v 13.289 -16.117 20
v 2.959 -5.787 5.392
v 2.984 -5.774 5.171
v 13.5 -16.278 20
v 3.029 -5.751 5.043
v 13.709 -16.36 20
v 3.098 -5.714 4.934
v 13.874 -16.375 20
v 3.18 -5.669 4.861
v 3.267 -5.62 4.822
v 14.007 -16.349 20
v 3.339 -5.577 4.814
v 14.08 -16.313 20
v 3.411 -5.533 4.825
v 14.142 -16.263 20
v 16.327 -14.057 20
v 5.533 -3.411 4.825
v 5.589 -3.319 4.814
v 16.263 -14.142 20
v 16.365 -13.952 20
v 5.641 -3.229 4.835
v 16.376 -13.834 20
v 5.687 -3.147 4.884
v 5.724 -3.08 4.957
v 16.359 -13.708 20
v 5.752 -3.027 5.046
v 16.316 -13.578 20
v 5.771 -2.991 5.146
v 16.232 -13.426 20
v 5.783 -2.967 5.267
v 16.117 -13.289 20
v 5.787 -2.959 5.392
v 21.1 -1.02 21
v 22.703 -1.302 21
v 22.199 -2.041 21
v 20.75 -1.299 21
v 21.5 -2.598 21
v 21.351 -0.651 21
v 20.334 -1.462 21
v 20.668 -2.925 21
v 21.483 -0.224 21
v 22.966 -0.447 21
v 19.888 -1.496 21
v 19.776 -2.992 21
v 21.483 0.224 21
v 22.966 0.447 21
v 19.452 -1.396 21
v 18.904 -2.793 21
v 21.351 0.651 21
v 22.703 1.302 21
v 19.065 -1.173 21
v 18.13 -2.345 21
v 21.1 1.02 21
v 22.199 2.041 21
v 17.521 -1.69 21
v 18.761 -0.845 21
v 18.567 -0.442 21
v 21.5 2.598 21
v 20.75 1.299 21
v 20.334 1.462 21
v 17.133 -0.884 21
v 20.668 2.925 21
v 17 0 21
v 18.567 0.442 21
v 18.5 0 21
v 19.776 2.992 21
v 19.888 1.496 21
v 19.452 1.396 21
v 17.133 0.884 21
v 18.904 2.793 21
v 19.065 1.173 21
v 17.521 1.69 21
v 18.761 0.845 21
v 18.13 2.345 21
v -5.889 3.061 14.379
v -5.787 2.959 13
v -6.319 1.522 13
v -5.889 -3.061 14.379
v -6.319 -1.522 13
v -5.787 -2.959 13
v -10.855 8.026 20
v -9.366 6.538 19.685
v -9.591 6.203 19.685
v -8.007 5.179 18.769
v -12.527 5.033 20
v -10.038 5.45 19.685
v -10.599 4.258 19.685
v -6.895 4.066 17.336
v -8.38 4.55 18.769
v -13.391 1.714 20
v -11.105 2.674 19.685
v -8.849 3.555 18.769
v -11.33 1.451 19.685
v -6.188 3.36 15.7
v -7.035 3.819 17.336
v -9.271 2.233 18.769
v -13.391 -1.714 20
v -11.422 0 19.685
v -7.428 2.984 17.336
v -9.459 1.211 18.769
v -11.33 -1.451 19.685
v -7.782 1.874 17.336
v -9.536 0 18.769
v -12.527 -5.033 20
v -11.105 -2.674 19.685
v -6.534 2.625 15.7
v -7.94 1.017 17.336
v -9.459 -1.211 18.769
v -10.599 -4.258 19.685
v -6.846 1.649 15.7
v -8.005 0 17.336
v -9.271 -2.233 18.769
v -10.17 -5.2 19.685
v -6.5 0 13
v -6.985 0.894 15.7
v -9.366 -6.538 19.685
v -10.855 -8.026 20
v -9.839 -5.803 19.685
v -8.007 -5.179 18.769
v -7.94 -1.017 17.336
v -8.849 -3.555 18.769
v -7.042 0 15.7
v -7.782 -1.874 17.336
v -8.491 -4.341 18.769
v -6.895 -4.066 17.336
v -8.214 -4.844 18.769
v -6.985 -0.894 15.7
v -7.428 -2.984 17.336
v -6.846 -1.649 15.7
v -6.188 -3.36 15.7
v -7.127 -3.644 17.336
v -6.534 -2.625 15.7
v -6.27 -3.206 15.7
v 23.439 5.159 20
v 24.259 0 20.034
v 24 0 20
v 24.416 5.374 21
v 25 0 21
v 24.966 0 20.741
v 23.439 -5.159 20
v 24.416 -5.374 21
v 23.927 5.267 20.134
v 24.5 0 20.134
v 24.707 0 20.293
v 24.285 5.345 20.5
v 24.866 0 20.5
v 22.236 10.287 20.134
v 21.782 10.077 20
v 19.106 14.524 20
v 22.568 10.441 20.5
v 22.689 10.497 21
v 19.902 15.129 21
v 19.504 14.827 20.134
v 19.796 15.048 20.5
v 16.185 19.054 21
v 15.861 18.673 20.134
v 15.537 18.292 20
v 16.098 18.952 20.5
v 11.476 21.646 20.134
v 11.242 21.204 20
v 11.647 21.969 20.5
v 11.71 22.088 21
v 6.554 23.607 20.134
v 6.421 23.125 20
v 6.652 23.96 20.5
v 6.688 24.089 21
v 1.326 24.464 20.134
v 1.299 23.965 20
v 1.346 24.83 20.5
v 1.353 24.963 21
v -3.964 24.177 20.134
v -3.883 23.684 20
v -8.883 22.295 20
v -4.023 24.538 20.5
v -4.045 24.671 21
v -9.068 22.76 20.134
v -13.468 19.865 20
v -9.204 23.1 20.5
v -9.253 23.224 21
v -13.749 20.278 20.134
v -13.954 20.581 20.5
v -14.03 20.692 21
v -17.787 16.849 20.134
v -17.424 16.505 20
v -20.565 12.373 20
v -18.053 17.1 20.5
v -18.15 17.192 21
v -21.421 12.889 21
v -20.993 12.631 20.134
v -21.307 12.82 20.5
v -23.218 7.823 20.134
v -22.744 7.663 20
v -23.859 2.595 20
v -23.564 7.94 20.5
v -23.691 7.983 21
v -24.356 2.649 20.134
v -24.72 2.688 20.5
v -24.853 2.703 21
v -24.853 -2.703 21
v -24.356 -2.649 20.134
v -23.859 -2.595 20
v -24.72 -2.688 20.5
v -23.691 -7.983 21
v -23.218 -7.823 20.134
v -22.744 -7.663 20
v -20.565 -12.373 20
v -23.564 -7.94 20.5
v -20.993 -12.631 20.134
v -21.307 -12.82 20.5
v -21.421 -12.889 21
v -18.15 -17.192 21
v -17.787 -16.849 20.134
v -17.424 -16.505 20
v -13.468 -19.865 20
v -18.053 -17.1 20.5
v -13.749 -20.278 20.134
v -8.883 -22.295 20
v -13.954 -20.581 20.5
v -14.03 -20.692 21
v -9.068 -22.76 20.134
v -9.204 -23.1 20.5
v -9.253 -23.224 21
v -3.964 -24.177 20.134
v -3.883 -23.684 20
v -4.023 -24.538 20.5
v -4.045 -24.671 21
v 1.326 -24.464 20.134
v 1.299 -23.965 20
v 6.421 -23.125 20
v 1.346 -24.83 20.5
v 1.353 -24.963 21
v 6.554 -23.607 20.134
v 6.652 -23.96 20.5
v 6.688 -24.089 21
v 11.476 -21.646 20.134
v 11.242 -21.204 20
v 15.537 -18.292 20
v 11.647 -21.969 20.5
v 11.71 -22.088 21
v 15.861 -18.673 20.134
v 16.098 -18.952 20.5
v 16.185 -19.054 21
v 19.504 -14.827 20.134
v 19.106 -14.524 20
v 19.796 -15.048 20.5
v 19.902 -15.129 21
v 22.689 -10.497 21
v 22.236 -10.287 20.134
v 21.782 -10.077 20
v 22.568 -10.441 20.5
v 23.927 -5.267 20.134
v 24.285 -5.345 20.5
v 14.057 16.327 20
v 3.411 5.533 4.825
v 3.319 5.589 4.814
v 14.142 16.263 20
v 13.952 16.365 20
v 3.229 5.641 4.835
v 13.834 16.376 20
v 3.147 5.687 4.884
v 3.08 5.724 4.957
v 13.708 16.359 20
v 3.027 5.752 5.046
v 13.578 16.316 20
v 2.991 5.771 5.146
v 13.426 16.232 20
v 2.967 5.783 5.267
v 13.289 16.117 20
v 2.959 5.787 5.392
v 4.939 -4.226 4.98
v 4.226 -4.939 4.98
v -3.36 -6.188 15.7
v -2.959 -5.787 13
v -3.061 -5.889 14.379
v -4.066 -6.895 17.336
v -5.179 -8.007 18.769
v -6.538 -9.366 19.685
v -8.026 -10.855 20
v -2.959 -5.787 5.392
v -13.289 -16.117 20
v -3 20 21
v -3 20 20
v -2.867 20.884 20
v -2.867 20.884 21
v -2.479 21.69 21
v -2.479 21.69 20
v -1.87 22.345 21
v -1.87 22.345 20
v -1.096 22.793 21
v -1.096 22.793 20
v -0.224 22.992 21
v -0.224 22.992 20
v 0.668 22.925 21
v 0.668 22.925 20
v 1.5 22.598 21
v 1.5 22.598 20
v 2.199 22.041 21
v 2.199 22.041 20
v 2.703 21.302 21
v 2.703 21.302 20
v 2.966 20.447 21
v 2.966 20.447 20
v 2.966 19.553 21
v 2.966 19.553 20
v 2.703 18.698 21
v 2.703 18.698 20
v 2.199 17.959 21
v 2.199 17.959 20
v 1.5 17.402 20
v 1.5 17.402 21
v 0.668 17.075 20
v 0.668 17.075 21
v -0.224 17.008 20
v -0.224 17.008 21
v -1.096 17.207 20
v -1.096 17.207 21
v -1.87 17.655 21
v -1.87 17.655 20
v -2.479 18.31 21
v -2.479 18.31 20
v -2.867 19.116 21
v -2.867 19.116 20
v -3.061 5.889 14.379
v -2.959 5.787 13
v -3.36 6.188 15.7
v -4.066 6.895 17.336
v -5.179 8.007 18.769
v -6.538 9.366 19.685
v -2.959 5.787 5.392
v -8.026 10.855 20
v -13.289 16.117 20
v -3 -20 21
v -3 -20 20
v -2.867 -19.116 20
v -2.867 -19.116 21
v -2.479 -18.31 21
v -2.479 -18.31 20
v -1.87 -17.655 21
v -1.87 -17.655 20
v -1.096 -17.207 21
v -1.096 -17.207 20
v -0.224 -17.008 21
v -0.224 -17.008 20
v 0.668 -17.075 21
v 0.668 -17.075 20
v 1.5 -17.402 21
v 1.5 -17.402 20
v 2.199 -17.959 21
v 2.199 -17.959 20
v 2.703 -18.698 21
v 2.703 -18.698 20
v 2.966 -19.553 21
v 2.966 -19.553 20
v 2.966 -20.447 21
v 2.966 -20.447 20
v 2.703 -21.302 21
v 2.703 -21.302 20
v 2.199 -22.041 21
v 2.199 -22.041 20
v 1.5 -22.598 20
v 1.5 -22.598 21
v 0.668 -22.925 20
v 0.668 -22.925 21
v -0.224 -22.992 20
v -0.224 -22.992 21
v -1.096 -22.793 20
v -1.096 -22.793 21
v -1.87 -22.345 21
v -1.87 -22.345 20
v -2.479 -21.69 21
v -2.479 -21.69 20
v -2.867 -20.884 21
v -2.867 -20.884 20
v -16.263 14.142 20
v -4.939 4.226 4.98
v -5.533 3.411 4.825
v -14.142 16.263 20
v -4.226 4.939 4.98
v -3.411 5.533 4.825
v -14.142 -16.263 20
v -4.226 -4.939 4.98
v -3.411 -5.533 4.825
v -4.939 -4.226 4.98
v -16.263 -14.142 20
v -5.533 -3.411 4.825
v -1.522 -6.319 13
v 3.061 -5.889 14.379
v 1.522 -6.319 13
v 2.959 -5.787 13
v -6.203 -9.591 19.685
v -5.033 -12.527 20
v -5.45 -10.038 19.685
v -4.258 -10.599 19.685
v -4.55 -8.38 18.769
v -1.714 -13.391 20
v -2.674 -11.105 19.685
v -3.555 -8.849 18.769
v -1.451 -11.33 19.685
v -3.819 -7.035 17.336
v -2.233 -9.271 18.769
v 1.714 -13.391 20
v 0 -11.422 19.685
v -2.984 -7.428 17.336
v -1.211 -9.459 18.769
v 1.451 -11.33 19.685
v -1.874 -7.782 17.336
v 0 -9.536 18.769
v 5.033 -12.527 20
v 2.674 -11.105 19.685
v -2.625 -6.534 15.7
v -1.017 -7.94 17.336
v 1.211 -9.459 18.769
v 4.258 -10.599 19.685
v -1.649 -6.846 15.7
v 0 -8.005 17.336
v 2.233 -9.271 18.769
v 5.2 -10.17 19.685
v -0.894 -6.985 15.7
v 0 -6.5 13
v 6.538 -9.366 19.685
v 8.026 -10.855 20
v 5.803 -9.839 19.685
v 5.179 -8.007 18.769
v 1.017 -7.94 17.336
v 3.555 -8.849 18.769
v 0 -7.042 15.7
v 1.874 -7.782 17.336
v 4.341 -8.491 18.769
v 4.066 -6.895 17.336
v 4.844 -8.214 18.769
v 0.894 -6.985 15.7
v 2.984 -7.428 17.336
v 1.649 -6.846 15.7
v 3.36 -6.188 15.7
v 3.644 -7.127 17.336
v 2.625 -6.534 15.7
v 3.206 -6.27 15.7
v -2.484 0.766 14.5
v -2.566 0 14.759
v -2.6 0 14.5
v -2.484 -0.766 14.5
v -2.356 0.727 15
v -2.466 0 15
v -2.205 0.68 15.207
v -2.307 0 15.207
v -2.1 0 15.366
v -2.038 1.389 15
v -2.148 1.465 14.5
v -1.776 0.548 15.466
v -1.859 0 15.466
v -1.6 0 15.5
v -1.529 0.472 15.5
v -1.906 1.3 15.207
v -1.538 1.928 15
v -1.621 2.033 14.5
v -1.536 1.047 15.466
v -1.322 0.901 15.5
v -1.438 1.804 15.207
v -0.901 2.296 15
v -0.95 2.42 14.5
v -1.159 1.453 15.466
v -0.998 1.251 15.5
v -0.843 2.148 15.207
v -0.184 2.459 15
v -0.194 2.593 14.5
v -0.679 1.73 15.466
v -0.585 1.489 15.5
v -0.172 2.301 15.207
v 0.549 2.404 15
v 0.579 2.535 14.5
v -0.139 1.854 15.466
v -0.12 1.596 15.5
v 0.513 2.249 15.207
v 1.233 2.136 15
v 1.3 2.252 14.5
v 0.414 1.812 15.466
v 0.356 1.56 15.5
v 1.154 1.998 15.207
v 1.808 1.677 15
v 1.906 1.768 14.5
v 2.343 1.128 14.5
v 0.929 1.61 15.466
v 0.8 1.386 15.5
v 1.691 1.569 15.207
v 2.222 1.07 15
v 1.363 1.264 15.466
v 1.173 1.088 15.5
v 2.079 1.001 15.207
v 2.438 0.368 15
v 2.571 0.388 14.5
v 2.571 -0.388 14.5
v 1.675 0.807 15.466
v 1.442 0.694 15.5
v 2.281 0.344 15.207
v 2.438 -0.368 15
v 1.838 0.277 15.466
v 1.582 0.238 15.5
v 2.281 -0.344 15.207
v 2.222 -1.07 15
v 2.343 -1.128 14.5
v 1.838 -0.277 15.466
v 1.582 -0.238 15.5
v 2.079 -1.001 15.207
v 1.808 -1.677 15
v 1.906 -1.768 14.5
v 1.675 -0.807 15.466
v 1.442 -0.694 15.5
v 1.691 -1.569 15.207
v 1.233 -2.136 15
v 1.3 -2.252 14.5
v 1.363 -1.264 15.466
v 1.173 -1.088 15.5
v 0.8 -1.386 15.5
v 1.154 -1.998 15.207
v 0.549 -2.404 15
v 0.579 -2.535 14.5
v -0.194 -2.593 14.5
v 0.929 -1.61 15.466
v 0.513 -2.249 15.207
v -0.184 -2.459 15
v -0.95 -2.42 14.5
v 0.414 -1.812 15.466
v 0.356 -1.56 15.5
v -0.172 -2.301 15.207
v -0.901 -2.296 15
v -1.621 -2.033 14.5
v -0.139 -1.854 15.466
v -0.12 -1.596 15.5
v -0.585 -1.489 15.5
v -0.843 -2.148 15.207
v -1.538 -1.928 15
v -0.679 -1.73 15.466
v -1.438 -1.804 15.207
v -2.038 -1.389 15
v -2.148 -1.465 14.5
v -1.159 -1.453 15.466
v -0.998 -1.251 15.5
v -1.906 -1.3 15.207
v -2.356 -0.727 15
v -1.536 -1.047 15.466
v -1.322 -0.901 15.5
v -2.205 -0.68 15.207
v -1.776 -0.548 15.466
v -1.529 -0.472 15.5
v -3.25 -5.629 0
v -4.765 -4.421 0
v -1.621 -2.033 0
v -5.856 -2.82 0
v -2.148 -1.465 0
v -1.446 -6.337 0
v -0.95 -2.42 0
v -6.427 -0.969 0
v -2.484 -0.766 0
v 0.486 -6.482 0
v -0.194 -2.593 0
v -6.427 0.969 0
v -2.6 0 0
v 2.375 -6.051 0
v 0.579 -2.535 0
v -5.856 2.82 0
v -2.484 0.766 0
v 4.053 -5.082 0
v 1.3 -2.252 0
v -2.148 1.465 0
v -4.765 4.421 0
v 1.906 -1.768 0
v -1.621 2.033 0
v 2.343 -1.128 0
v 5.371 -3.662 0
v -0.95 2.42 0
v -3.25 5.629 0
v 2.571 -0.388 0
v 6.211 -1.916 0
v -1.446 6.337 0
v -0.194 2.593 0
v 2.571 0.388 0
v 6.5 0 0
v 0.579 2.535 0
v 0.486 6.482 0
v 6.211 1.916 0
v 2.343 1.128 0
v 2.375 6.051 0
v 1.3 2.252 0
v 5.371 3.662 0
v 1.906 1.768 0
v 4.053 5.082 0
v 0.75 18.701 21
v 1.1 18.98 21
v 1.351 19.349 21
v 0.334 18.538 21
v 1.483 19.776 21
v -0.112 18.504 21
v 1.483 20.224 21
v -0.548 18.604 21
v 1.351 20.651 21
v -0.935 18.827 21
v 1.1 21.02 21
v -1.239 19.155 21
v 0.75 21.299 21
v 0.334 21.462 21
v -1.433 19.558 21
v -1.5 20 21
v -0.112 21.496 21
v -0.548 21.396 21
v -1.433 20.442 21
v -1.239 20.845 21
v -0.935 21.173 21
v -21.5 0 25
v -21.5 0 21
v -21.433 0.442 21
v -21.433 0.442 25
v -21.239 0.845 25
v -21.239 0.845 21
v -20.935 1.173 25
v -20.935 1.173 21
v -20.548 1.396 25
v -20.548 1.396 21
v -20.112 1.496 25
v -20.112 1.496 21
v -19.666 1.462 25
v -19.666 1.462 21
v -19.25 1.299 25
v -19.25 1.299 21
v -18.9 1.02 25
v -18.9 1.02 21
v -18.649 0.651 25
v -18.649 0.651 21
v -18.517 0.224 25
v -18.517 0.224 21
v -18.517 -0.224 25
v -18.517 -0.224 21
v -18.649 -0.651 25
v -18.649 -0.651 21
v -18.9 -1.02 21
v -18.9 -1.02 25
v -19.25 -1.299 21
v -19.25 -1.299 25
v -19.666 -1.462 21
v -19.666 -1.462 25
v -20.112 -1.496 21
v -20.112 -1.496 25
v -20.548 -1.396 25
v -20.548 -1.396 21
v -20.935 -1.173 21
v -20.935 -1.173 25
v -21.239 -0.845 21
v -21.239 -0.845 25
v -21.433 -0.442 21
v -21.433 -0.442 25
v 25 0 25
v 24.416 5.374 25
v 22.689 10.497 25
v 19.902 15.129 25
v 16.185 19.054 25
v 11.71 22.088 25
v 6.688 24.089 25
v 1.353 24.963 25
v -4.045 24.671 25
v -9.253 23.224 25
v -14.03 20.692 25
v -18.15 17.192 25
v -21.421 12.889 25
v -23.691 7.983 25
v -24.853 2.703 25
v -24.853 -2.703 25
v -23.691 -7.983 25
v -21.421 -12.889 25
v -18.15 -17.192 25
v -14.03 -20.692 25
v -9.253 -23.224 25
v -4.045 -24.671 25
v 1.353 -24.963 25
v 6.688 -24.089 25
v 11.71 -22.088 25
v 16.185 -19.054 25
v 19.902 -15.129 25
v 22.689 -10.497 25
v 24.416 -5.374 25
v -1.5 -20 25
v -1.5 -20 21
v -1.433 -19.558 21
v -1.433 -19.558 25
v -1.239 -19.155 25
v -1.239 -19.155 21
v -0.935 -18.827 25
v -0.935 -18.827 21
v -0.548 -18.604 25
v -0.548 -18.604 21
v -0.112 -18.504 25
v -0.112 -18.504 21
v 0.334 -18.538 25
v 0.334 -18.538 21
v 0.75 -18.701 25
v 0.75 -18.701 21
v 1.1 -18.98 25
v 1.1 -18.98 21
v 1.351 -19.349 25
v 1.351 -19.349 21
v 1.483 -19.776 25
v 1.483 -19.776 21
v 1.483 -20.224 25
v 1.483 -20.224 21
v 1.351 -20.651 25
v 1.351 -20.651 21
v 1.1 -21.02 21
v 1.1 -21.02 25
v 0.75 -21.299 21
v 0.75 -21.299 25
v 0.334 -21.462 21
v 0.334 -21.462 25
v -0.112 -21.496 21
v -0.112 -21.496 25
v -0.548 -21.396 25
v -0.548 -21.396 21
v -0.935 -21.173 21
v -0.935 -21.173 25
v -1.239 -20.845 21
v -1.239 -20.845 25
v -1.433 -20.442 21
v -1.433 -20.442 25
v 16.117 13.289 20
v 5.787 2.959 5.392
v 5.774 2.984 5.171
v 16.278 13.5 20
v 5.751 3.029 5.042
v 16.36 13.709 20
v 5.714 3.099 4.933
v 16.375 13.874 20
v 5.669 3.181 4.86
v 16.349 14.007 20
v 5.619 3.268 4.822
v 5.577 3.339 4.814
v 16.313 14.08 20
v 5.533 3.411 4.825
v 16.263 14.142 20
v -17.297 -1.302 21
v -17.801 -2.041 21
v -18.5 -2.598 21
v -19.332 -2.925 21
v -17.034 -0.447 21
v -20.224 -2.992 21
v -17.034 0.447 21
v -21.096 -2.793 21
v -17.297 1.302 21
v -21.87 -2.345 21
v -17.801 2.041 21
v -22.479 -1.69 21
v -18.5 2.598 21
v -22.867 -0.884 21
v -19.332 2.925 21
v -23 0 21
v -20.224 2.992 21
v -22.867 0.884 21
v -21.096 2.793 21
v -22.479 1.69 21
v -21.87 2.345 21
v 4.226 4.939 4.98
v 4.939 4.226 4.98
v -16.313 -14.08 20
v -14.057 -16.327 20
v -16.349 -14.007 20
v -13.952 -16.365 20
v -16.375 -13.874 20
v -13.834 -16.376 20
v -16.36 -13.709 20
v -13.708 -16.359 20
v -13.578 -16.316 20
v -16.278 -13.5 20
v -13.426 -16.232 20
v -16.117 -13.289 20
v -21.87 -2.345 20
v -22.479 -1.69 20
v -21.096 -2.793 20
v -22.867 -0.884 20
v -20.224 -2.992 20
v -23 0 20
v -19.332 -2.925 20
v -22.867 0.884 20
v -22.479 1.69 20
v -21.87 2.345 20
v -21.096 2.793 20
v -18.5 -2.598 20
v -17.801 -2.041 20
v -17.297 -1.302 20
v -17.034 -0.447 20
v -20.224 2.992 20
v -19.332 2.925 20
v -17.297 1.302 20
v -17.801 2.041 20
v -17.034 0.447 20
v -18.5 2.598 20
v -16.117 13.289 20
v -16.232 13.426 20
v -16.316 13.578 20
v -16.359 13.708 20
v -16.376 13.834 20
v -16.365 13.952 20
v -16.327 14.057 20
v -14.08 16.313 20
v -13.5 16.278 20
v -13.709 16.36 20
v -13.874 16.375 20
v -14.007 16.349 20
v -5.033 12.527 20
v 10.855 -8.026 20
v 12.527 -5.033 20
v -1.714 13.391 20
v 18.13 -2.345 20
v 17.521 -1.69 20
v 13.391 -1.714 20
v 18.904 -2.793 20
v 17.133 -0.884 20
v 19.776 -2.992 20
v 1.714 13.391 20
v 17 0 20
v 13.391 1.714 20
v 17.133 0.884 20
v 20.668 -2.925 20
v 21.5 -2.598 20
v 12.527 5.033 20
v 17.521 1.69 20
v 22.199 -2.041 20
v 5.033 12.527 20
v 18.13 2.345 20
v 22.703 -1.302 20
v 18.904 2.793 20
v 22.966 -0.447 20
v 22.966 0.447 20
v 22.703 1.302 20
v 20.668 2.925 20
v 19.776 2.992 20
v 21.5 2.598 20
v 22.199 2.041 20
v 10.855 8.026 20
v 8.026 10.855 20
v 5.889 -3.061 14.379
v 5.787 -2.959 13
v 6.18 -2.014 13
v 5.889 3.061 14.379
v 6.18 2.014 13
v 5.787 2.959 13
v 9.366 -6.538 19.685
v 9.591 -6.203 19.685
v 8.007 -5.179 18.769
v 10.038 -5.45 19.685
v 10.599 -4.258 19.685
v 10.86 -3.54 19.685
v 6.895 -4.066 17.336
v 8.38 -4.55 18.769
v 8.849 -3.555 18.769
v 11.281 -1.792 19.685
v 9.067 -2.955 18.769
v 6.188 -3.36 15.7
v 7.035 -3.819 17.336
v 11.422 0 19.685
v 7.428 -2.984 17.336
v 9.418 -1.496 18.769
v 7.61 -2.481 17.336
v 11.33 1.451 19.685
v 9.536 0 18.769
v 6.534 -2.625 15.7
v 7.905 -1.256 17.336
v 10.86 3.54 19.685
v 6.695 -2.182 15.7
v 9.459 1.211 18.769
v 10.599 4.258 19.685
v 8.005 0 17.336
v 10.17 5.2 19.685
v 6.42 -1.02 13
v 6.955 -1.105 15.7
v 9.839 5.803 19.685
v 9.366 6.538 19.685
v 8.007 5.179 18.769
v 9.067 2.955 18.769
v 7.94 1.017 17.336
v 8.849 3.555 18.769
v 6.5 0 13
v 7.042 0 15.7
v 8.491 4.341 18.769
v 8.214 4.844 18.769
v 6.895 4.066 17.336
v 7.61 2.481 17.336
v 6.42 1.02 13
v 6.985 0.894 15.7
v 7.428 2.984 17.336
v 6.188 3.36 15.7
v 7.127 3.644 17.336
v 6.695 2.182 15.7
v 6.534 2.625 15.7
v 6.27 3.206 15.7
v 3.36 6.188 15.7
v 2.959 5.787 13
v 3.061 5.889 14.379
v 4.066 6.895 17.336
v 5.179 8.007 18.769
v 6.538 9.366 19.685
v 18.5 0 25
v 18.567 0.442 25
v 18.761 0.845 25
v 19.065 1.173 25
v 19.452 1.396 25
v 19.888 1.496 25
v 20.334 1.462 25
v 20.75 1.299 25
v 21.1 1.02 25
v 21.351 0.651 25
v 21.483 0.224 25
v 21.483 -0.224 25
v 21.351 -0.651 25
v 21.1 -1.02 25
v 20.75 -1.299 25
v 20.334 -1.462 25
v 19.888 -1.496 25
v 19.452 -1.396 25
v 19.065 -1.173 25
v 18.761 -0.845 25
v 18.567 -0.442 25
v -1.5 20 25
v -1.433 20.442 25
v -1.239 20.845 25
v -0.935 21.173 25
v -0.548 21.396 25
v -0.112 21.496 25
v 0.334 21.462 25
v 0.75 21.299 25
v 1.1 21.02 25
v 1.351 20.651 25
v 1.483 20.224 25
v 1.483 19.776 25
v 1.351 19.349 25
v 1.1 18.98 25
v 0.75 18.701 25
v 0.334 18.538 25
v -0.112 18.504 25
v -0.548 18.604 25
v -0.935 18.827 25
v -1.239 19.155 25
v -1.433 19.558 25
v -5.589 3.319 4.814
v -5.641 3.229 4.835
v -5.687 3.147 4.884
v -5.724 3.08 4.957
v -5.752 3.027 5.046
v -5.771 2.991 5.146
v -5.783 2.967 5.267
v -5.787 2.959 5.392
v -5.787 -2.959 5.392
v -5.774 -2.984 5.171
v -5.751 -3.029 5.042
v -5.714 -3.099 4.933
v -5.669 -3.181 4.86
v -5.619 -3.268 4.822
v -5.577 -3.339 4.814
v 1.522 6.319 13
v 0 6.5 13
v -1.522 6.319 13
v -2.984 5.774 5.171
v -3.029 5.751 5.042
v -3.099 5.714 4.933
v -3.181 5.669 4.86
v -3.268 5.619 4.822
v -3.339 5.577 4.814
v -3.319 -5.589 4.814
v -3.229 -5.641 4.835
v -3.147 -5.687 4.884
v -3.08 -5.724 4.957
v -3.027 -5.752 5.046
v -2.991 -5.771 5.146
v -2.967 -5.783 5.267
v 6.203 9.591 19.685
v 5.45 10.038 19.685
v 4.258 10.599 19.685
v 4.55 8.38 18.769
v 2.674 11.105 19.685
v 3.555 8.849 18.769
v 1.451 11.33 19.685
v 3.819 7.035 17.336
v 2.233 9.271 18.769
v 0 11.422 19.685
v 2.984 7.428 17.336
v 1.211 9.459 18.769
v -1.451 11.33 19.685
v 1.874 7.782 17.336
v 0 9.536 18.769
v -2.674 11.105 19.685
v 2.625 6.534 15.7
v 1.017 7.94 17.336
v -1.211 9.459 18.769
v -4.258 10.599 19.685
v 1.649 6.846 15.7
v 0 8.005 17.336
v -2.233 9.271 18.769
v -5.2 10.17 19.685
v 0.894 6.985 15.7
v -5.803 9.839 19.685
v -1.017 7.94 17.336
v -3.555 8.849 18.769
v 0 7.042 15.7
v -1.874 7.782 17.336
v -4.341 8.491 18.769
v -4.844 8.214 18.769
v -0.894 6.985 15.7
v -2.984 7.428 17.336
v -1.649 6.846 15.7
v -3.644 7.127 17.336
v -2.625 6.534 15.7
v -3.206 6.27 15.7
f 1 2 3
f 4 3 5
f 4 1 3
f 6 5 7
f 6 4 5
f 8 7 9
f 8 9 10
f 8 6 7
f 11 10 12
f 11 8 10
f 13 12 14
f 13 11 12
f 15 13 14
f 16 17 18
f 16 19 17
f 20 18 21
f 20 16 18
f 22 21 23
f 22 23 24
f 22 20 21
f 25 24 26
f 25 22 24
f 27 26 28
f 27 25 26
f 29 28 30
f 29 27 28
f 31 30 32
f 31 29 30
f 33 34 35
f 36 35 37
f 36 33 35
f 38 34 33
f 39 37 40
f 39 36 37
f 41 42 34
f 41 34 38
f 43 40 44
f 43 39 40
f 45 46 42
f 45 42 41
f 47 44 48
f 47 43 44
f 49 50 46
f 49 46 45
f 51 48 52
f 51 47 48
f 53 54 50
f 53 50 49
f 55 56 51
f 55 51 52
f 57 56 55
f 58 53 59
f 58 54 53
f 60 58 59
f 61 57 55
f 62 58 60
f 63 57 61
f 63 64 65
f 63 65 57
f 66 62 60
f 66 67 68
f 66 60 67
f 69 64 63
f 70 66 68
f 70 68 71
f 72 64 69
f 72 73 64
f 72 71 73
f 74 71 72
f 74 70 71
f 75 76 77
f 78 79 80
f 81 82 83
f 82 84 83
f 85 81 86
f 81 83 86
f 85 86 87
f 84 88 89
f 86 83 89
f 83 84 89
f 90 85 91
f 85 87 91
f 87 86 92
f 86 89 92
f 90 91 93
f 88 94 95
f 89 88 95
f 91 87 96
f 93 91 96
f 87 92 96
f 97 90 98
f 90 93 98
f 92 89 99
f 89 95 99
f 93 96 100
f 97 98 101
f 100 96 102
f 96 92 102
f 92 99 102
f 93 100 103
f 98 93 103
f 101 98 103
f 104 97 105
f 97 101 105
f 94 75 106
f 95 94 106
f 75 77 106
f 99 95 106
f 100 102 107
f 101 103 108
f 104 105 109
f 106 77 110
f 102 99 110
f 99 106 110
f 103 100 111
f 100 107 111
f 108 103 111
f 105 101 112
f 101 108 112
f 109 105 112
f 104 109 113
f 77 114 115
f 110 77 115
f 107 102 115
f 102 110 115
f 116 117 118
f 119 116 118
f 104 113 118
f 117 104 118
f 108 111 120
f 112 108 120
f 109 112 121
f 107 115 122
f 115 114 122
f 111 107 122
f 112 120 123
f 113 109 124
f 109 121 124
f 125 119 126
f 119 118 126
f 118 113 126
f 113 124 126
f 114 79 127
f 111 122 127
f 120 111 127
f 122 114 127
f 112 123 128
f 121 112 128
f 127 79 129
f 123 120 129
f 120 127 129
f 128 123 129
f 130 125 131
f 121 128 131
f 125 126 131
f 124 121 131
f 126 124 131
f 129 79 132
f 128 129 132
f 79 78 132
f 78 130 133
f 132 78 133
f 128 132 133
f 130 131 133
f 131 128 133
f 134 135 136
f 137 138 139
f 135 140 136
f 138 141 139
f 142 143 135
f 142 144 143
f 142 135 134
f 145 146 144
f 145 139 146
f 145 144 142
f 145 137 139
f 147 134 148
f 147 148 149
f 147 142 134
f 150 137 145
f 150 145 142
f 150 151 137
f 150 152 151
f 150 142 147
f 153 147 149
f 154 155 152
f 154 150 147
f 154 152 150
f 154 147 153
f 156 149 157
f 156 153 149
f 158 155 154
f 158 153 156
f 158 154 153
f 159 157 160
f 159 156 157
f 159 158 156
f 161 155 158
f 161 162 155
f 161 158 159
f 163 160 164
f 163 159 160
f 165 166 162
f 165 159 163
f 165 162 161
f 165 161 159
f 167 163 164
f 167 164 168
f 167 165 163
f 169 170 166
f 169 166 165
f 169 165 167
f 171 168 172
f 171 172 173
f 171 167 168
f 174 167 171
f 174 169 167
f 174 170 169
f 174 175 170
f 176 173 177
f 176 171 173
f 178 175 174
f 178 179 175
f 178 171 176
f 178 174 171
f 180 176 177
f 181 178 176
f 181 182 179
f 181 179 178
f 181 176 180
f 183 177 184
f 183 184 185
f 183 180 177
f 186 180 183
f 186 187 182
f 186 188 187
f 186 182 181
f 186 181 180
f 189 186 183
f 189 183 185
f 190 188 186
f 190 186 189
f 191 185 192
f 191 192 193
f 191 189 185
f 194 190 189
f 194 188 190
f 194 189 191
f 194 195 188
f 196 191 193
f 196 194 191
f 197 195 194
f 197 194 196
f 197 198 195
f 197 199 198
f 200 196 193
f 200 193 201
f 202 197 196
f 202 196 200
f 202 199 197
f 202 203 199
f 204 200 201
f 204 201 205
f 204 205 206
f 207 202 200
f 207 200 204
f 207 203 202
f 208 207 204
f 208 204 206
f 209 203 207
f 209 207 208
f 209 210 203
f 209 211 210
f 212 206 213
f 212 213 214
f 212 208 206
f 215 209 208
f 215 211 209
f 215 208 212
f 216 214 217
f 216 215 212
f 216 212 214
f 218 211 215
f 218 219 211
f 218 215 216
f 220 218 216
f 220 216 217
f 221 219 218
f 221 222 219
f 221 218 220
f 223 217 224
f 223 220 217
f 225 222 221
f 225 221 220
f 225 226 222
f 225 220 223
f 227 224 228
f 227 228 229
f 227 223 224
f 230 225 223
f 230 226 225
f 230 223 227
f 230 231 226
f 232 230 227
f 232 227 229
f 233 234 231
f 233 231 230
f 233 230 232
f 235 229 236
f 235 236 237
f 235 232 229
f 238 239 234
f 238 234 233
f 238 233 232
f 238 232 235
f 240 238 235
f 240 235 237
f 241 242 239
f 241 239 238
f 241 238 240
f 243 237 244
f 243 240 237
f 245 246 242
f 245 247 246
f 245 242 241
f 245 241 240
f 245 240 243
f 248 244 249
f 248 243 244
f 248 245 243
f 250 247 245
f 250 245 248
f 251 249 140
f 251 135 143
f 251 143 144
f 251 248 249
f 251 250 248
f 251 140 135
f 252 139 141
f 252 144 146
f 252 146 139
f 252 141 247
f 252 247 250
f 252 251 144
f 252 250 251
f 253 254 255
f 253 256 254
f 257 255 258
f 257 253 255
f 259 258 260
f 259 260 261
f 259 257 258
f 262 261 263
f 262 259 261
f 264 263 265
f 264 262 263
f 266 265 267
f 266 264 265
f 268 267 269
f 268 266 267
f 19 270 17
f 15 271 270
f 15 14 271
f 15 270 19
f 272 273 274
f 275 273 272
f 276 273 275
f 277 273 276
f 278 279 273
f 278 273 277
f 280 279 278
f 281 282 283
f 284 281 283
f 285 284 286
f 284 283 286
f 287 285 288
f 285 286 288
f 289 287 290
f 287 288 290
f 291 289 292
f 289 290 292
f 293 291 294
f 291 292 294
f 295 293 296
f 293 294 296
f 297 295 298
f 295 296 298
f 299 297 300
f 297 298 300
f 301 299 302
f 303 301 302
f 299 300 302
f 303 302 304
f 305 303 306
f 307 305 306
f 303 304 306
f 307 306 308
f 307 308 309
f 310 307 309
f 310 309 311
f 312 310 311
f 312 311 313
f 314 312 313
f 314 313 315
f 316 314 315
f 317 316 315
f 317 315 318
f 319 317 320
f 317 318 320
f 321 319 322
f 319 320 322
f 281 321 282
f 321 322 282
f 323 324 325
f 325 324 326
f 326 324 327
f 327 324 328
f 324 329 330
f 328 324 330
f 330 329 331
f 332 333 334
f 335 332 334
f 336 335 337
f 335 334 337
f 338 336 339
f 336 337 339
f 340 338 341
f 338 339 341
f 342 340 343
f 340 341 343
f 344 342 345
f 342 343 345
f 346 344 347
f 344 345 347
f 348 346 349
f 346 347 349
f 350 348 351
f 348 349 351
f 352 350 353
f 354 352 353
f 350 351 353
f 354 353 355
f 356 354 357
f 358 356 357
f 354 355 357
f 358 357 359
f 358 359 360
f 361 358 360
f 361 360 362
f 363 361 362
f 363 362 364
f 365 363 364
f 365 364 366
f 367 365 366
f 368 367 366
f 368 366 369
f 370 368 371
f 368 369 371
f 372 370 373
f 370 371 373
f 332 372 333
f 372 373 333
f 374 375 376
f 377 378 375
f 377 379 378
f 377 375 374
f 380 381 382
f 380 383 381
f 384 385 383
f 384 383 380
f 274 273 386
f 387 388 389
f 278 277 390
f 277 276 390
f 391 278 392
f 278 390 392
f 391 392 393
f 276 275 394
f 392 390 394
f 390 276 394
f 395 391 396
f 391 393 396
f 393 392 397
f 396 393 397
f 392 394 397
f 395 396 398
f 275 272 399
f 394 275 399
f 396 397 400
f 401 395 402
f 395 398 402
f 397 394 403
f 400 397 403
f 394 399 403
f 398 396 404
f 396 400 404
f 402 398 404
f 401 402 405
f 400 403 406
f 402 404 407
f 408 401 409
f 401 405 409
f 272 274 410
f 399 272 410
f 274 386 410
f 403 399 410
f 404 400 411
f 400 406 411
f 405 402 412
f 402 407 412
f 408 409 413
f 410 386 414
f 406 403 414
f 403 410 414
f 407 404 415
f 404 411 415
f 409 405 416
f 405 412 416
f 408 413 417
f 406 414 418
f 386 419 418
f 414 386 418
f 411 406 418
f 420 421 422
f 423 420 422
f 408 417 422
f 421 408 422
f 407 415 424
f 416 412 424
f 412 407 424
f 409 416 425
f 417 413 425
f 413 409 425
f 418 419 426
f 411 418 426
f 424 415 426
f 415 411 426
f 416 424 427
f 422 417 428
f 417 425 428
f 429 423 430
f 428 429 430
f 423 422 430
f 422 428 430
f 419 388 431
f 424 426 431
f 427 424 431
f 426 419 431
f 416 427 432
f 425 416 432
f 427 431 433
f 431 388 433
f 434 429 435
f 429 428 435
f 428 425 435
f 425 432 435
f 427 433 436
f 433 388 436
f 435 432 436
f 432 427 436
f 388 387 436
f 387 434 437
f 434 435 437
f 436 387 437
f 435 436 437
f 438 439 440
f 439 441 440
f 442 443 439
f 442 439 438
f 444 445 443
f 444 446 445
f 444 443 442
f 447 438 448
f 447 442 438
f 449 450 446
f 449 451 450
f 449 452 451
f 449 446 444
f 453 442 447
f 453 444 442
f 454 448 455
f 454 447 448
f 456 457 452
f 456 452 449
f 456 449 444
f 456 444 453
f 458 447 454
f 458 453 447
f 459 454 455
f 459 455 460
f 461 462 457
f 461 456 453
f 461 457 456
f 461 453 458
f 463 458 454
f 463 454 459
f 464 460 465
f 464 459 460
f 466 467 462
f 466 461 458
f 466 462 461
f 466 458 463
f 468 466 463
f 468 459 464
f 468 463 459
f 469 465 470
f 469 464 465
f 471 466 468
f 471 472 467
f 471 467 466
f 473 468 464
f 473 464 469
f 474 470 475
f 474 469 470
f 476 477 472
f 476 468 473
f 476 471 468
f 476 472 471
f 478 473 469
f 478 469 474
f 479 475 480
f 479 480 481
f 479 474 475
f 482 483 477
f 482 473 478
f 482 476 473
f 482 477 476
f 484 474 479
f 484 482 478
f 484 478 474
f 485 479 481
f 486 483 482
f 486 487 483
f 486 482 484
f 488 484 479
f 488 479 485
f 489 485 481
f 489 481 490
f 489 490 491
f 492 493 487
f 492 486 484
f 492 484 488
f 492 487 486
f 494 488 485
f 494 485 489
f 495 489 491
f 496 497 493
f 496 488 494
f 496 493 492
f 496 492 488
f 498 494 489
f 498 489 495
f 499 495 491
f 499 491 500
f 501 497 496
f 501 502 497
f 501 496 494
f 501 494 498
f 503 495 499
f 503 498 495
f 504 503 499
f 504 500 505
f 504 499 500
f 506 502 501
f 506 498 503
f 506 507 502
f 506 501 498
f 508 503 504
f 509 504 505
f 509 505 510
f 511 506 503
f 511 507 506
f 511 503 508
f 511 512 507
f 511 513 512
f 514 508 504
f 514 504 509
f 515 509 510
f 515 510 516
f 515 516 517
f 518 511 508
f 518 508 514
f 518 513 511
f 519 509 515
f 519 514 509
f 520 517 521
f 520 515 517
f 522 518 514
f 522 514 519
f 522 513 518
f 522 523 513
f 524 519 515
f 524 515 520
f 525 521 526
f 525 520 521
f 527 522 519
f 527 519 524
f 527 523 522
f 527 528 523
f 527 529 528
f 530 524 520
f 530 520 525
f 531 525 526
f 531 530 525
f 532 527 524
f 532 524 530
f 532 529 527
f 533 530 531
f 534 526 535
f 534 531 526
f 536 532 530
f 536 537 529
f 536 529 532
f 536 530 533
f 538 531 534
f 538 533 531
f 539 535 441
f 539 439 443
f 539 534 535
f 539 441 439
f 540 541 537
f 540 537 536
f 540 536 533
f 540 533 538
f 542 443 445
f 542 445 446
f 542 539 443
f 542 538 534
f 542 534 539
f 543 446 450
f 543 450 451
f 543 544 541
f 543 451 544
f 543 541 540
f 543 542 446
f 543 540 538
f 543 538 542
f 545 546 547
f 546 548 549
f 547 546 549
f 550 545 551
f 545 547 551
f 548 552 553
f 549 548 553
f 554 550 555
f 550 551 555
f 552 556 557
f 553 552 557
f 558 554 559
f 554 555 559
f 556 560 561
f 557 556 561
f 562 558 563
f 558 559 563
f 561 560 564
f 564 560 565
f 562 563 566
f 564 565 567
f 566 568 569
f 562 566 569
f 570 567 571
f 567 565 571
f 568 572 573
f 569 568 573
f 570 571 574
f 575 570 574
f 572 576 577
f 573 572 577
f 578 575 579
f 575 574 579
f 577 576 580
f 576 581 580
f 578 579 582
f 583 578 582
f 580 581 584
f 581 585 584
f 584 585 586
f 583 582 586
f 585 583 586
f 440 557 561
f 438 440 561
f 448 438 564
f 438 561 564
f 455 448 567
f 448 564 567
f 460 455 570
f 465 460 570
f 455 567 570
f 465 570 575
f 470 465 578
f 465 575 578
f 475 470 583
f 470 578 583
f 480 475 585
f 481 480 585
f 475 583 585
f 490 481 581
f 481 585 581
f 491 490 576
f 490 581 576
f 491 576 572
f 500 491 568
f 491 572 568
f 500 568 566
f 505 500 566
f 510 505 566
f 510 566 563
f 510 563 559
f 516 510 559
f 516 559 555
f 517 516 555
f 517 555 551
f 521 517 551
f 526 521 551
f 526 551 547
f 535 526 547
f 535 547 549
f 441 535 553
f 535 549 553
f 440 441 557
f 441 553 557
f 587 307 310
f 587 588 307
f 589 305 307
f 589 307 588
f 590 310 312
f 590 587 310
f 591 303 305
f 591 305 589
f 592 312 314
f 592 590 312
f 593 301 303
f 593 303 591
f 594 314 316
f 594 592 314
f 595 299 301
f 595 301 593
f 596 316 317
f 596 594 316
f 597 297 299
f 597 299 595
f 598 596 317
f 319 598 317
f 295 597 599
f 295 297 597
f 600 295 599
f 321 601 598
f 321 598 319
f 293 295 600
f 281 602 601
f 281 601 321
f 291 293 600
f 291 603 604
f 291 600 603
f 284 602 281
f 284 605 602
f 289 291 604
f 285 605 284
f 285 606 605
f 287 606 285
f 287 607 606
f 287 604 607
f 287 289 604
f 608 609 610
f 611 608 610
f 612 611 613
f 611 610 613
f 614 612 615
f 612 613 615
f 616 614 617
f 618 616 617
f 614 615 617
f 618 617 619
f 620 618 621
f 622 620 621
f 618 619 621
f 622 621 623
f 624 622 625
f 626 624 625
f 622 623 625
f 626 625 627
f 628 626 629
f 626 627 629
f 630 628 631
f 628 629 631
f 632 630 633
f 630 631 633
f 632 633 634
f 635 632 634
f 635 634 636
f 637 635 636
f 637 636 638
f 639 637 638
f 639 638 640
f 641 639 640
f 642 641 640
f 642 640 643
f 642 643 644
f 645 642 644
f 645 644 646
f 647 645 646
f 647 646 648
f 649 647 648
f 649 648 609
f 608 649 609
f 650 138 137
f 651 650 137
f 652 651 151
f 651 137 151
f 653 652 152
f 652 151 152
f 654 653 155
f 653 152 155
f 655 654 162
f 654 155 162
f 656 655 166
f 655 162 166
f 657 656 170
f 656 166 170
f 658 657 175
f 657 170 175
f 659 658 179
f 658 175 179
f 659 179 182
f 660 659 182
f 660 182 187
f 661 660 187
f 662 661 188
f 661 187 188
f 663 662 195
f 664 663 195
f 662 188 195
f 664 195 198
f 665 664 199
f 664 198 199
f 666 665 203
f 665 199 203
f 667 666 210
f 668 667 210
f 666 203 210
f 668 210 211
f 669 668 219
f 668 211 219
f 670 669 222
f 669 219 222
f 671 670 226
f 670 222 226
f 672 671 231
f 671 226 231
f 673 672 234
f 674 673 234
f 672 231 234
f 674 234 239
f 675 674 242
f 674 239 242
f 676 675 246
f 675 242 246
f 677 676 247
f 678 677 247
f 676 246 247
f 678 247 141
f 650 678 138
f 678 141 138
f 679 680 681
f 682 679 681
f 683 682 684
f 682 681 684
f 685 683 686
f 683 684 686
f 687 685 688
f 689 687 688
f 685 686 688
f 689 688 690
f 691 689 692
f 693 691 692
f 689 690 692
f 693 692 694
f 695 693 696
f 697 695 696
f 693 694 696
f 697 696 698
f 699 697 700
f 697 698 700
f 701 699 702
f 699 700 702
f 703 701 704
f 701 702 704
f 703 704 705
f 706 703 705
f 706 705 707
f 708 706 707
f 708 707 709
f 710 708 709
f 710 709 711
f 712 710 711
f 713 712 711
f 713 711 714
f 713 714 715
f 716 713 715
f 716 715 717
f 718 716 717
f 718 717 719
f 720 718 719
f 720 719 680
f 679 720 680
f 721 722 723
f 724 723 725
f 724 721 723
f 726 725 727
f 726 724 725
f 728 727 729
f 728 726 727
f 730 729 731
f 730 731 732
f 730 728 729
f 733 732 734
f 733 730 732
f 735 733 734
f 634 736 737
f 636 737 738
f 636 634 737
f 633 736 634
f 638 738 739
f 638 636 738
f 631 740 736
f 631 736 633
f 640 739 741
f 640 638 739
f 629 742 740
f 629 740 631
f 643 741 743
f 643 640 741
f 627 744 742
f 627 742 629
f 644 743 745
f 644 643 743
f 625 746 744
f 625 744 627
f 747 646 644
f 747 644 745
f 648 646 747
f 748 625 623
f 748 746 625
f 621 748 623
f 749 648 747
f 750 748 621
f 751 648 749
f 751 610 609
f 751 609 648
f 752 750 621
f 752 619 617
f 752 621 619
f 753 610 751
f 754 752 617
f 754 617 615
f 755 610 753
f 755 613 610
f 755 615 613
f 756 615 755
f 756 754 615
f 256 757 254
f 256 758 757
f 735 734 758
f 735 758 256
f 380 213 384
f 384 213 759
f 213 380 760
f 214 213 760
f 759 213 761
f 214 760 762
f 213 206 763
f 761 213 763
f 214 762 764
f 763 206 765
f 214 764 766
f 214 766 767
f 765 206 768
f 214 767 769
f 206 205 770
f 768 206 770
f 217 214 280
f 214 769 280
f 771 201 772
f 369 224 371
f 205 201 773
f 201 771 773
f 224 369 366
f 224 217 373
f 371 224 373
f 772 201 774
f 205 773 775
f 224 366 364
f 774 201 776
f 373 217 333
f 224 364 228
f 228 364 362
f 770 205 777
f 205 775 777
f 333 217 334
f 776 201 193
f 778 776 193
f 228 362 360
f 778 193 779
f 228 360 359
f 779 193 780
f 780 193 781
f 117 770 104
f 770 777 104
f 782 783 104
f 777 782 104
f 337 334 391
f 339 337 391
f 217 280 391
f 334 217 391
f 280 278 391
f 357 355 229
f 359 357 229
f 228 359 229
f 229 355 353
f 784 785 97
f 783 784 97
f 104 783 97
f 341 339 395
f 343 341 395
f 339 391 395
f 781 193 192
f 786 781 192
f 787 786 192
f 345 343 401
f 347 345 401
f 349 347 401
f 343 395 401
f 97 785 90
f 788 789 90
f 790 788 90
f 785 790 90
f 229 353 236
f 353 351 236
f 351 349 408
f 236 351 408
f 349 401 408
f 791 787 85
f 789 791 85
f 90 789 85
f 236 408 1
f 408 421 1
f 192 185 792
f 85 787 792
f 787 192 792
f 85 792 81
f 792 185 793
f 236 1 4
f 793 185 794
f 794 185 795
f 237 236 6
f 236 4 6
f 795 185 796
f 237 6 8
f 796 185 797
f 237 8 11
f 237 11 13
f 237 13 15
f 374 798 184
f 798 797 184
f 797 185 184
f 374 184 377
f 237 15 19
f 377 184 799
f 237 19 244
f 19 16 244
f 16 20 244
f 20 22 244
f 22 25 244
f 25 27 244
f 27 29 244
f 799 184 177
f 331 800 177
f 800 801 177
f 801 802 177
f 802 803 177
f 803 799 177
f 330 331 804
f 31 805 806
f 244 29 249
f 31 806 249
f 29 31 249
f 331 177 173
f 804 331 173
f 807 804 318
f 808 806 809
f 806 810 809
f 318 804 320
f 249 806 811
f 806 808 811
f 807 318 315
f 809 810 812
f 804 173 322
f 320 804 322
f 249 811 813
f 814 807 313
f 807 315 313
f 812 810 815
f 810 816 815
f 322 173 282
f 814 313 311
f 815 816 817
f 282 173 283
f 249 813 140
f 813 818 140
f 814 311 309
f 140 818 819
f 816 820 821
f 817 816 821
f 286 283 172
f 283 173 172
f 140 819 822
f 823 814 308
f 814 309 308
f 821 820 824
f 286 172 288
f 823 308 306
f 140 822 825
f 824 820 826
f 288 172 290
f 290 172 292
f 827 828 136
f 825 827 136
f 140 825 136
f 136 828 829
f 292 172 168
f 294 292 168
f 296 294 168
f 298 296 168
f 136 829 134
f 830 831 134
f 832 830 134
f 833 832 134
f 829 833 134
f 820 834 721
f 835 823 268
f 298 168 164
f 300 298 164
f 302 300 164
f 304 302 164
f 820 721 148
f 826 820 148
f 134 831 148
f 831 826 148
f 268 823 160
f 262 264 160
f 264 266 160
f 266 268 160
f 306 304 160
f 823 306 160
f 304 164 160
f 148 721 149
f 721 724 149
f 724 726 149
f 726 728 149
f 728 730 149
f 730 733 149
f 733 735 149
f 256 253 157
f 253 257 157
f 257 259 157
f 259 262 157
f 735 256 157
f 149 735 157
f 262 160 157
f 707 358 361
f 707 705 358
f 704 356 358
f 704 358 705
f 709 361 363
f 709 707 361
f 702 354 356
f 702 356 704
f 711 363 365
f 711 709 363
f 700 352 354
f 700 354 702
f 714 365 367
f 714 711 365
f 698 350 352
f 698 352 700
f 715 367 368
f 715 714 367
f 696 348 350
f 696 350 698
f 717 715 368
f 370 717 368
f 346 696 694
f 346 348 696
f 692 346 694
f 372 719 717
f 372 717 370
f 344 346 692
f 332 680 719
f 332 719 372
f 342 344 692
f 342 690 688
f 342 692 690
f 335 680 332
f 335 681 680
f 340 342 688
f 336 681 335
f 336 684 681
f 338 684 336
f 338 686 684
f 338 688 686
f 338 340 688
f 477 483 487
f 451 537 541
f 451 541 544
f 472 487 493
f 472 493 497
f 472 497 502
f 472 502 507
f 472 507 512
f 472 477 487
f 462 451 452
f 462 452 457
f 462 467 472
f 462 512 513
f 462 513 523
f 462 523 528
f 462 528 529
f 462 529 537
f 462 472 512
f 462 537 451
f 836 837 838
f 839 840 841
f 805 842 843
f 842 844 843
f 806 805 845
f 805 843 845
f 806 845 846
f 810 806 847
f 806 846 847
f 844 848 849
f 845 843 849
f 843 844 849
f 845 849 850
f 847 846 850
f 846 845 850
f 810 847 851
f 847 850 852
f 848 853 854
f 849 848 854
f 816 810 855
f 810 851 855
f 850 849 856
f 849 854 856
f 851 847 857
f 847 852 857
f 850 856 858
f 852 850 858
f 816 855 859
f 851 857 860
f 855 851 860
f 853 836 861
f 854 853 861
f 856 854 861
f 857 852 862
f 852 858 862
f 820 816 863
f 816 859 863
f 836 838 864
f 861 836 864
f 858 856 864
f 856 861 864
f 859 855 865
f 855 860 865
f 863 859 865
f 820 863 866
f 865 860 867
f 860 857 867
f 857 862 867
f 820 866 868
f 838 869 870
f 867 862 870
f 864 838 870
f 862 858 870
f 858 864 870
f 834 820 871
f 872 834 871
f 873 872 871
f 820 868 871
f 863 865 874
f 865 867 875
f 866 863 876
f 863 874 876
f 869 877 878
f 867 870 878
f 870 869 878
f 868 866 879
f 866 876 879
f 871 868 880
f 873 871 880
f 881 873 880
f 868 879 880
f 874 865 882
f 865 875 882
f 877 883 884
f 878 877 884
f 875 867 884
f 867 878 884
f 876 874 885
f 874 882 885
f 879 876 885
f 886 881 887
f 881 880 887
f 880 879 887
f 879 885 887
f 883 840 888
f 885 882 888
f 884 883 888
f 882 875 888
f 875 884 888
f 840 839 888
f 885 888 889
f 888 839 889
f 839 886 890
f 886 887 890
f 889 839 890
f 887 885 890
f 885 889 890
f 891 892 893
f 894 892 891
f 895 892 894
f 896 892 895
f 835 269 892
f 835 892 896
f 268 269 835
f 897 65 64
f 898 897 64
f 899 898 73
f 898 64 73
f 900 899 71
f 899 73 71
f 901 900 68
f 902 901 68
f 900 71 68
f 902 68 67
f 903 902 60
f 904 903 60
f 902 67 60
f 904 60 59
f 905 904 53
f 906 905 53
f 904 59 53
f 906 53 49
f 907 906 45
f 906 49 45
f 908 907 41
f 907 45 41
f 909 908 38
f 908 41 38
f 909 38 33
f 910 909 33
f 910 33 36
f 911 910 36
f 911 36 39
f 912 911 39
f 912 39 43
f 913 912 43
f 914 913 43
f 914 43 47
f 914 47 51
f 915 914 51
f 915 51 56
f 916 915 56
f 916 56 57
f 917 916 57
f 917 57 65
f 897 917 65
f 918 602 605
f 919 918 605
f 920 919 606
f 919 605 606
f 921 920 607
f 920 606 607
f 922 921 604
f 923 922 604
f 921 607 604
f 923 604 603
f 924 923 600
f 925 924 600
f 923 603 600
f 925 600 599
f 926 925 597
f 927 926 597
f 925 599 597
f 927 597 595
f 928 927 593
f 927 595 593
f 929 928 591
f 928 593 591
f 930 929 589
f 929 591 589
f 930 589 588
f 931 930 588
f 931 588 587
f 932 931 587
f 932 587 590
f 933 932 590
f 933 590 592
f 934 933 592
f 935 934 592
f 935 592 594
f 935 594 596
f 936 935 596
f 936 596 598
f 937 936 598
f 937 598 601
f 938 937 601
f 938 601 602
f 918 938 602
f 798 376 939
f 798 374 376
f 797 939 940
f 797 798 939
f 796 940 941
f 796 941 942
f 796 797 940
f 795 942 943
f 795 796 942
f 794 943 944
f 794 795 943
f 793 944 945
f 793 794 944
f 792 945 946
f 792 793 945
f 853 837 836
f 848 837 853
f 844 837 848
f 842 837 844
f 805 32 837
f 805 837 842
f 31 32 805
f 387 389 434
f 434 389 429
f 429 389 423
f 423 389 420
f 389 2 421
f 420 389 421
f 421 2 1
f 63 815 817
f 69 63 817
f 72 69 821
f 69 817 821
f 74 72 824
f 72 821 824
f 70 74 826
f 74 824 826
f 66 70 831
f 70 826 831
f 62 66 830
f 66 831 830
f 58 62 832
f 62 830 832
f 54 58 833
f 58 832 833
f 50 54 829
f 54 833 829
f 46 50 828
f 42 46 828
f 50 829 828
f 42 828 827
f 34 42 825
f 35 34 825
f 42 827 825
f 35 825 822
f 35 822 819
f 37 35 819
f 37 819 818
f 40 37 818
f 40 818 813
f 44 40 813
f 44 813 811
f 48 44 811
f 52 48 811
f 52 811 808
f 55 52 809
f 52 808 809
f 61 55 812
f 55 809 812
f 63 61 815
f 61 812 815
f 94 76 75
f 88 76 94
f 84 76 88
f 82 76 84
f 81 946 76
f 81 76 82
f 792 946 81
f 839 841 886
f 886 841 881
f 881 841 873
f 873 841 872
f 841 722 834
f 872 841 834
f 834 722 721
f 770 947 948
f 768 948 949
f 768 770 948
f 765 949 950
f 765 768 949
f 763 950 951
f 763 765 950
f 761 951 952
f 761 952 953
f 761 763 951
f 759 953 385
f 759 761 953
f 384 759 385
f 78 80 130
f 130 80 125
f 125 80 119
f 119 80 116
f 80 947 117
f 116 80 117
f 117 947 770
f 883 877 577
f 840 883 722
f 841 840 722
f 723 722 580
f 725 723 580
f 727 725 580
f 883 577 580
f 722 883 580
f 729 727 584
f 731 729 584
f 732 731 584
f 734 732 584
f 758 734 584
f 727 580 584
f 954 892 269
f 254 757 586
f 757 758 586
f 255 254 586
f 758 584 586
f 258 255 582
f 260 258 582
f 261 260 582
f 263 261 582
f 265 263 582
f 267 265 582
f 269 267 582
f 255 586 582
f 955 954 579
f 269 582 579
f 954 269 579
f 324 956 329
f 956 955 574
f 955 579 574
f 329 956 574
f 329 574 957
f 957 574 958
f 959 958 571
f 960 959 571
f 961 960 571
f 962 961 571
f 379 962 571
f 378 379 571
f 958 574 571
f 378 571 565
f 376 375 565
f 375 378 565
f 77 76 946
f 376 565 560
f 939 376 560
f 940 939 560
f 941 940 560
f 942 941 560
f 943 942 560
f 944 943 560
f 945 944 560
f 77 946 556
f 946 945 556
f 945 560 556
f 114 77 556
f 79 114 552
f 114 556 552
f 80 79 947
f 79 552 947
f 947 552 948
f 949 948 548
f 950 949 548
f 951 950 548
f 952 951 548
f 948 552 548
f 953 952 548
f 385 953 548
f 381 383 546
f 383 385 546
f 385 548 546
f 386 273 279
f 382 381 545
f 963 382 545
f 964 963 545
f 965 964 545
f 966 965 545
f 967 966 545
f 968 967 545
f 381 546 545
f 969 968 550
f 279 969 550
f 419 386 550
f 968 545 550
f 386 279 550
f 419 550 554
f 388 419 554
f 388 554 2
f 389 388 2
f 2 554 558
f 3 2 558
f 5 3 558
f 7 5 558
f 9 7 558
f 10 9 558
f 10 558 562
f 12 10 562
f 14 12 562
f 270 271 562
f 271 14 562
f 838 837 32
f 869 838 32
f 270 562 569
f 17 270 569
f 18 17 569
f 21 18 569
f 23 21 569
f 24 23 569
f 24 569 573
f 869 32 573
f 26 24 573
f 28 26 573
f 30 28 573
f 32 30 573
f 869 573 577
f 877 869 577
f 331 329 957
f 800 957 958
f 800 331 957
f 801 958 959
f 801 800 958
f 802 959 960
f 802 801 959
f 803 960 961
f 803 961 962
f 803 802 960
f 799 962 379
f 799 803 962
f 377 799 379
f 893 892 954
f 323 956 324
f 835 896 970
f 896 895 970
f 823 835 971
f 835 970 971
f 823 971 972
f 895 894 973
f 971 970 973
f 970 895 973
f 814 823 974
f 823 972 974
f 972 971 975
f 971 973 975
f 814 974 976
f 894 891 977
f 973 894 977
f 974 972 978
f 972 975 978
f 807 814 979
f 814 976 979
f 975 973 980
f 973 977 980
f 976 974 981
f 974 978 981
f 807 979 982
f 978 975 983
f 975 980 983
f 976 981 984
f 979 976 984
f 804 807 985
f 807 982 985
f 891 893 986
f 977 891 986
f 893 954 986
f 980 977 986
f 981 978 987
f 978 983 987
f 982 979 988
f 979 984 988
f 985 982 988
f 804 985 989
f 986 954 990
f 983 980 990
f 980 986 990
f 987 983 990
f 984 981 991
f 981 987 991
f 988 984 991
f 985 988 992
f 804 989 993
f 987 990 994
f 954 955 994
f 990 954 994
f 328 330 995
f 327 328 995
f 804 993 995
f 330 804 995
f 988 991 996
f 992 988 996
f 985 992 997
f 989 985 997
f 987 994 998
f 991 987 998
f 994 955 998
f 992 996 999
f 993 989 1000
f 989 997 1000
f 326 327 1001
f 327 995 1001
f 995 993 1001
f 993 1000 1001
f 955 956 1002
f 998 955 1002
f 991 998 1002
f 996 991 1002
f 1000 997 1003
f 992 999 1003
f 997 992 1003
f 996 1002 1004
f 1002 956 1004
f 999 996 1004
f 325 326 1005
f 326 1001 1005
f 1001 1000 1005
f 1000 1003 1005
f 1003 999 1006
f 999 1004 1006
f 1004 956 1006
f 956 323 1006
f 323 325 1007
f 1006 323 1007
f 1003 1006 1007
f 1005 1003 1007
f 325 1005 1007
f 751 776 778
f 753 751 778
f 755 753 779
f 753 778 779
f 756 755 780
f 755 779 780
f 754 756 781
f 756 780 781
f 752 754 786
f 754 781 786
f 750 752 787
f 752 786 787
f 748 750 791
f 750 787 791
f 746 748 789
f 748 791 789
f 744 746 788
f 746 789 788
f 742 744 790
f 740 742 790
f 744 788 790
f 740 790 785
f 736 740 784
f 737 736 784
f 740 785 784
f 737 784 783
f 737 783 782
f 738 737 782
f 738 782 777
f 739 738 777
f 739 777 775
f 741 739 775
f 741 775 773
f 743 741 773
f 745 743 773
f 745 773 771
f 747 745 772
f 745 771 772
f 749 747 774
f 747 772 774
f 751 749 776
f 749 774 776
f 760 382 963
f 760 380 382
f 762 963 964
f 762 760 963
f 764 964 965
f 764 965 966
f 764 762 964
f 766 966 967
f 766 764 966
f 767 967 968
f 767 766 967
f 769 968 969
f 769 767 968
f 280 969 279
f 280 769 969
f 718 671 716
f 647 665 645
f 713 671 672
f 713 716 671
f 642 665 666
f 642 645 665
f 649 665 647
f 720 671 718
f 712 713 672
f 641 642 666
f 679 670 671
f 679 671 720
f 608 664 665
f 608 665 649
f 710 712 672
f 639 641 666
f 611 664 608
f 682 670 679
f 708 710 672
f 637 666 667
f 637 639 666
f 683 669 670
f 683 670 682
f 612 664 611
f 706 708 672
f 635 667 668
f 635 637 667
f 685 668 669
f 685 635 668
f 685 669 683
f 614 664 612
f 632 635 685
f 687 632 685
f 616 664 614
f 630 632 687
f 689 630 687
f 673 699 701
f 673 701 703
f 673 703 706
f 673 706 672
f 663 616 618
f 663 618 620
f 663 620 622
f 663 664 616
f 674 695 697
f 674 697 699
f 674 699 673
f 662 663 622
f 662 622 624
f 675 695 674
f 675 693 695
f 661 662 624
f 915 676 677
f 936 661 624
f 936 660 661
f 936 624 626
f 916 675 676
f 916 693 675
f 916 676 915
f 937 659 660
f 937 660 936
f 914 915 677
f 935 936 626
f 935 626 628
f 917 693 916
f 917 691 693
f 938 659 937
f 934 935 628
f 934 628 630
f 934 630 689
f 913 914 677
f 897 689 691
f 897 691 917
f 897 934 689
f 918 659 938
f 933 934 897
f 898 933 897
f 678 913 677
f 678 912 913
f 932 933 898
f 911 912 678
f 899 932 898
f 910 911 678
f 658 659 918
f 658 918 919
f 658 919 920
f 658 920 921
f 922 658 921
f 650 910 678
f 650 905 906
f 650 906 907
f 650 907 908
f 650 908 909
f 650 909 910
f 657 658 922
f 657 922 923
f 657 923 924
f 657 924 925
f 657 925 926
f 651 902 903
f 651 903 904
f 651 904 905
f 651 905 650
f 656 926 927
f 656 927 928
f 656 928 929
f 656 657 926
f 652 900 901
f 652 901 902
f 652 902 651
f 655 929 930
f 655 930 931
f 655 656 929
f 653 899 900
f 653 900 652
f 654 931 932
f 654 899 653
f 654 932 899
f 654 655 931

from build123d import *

# Parameters (mm, degrees)
SKETCH1_R           = 6.5
BOSS_EXTRUDE1_DEPTH = 20
SKETCH4_R           = 2.6
CUT_EXTRUDE1_DEPTH  = 15.5
FILLET1_R           = 1
SKETCH5_R           = 25
BOSS_EXTRUDE2_DEPTH = 5
CUT_EXTRUDE2_REACH  = 42.62
SKETCH6_R           = 1.5
FILLET2_R           = 7
RIB10_REACH         = 45.301
SKETCH12_WALL_W     = 109.815743814
SKETCH12_WALL_H     = 4
CIRPATTERN1_COUNT   = 4
FILLET3_R           = 1
FILLET4_R           = 0.5
SKETCH13_R          = 3
CUT_EXTRUDE3_DEPTH  = 1


with BuildPart() as part:
    # Sketch1 → Boss-Extrude1 (new body)
    with BuildSketch(Plane.XY):
        Circle(SKETCH1_R)
    extrude(amount=BOSS_EXTRUDE1_DEPTH)

    # Sketch4 → Cut-Extrude1 (cut)
    with BuildSketch(Plane(origin=(0, 0, 0), x_dir=(-1, 0, 0), z_dir=(0, 0, -1))):
        Circle(SKETCH4_R)
    extrude(amount=-CUT_EXTRUDE1_DEPTH, mode=Mode.SUBTRACT)

    # Fillet1
    fillet1_edges = [part.edges().sort_by_distance(p)[0] for p in [
        (2.6, 0, 15.5),
    ]]
    fillet(fillet1_edges, radius=FILLET1_R)

    # Sketch5 → Boss-Extrude2 (add)
    with BuildSketch(Plane.XY.offset(20)):
        Circle(SKETCH5_R)
    extrude(amount=BOSS_EXTRUDE2_DEPTH)

    # Sketch6 → Cut-Extrude2 (cut, up to next)
    with BuildSketch(Plane(origin=(0, 0, 20), x_dir=(-1, 0, 0), z_dir=(0, 0, -1)), mode=Mode.PRIVATE) as cut_extrude2_sk1:
        with Locations((0, 20)):
            Circle(SKETCH6_R)
    cut_extrude2_tool1 = extrude(cut_extrude2_sk1.sketch, amount=-CUT_EXTRUDE2_REACH, mode=Mode.PRIVATE) & part.part
    # Sketch6 → Cut-Extrude2 (cut, up to next)
    with BuildSketch(Plane(origin=(0, 0, 20), x_dir=(-1, 0, 0), z_dir=(0, 0, -1)), mode=Mode.PRIVATE) as cut_extrude2_sk2:
        with Locations((0, -20)):
            Circle(SKETCH6_R)
    cut_extrude2_tool2 = extrude(cut_extrude2_sk2.sketch, amount=-CUT_EXTRUDE2_REACH, mode=Mode.PRIVATE) & part.part
    # Sketch6 → Cut-Extrude2 (cut, up to next)
    with BuildSketch(Plane(origin=(0, 0, 20), x_dir=(-1, 0, 0), z_dir=(0, 0, -1)), mode=Mode.PRIVATE) as cut_extrude2_sk3:
        with Locations((-20, 0)):
            Circle(SKETCH6_R)
    cut_extrude2_tool3 = extrude(cut_extrude2_sk3.sketch, amount=-CUT_EXTRUDE2_REACH, mode=Mode.PRIVATE) & part.part
    # Sketch6 → Cut-Extrude2 (cut, up to next)
    with BuildSketch(Plane(origin=(0, 0, 20), x_dir=(-1, 0, 0), z_dir=(0, 0, -1)), mode=Mode.PRIVATE) as cut_extrude2_sk4:
        with Locations((20, 0)):
            Circle(SKETCH6_R)
    cut_extrude2_tool4 = extrude(cut_extrude2_sk4.sketch, amount=-CUT_EXTRUDE2_REACH, mode=Mode.PRIVATE) & part.part
    add(cut_extrude2_tool1.solids().sort_by_distance((0, 20, 20))[0], mode=Mode.SUBTRACT)
    add(cut_extrude2_tool2.solids().sort_by_distance((0, -20, 20))[0], mode=Mode.SUBTRACT)
    add(cut_extrude2_tool3.solids().sort_by_distance((20, 0, 20))[0], mode=Mode.SUBTRACT)
    add(cut_extrude2_tool4.solids().sort_by_distance((-20, 0, 20))[0], mode=Mode.SUBTRACT)

    # Fillet2
    fillet2_edges = [part.edges().sort_by_distance(p)[0] for p in [
        (-6.5, 0, 20),
    ]]
    fillet(fillet2_edges, radius=FILLET2_R)

    # Sketch12 wall → Rib10 (add, up to next)
    with BuildSketch(Plane(origin=(9.899494937, 9.899494937, 12.5), x_dir=(0.500000000005, 0.500000000005, 0.70710678118), z_dir=(0.499999999995, 0.499999999995, -0.707106781193)), mode=Mode.PRIVATE) as rib10_sk1:
        Rectangle(SKETCH12_WALL_W, SKETCH12_WALL_H)
    rib10_tool1 = extrude(rib10_sk1.sketch, amount=-RIB10_REACH, mode=Mode.PRIVATE) - part.part
    rib10 = rib10_tool1.solids().sort_by_distance((9.899494937, 9.899494937, 12.5))[0]
    add(rib10)

    # CirPattern1: Rib10 ×4 about axis
    cirpattern1_axis = Axis((0, 0, 0), (0, 0, 1))
    for i in range(1, CIRPATTERN1_COUNT):
        add(rib10.rotate(cirpattern1_axis, i * 360 / CIRPATTERN1_COUNT))

    # Fillet3
    fillet3_edges = [part.edges().sort_by_distance(p)[0] for p in [
        (-25, 0, 20),
    ]]
    fillet(fillet3_edges, radius=FILLET3_R)

    # Fillet4
    fillet4_edges = [part.edges().sort_by_distance(p)[0] for p in [
        (8.373791296, -11.202218421, 12.342329219),
        (11.202218421, -8.373791296, 12.342329219),
        (-8.373791296, -11.202218421, 12.342329219),
        (-11.202218421, -8.373791296, 12.342329219),
        (11.202218421, 8.373791296, 12.342329219),
        (8.373791296, 11.202218421, 12.342329219),
        (-11.202218421, 8.373791296, 12.342329219),
        (-8.373791296, 11.202218421, 12.342329219),
    ]]
    fillet(fillet4_edges, radius=FILLET4_R)

    # Sketch13 → Cut-Extrude3 (cut)
    with BuildSketch(Plane(origin=(0, 0, 20), x_dir=(-1, 0, 0), z_dir=(0, 0, -1))):
        with Locations((-20, 0)):
            Circle(SKETCH13_R)
        with Locations((0, 20)):
            Circle(SKETCH13_R)
        with Locations((20, 0)):
            Circle(SKETCH13_R)
        with Locations((0, -20)):
            Circle(SKETCH13_R)
    extrude(amount=-CUT_EXTRUDE3_DEPTH, mode=Mode.SUBTRACT)


solid = part.part
